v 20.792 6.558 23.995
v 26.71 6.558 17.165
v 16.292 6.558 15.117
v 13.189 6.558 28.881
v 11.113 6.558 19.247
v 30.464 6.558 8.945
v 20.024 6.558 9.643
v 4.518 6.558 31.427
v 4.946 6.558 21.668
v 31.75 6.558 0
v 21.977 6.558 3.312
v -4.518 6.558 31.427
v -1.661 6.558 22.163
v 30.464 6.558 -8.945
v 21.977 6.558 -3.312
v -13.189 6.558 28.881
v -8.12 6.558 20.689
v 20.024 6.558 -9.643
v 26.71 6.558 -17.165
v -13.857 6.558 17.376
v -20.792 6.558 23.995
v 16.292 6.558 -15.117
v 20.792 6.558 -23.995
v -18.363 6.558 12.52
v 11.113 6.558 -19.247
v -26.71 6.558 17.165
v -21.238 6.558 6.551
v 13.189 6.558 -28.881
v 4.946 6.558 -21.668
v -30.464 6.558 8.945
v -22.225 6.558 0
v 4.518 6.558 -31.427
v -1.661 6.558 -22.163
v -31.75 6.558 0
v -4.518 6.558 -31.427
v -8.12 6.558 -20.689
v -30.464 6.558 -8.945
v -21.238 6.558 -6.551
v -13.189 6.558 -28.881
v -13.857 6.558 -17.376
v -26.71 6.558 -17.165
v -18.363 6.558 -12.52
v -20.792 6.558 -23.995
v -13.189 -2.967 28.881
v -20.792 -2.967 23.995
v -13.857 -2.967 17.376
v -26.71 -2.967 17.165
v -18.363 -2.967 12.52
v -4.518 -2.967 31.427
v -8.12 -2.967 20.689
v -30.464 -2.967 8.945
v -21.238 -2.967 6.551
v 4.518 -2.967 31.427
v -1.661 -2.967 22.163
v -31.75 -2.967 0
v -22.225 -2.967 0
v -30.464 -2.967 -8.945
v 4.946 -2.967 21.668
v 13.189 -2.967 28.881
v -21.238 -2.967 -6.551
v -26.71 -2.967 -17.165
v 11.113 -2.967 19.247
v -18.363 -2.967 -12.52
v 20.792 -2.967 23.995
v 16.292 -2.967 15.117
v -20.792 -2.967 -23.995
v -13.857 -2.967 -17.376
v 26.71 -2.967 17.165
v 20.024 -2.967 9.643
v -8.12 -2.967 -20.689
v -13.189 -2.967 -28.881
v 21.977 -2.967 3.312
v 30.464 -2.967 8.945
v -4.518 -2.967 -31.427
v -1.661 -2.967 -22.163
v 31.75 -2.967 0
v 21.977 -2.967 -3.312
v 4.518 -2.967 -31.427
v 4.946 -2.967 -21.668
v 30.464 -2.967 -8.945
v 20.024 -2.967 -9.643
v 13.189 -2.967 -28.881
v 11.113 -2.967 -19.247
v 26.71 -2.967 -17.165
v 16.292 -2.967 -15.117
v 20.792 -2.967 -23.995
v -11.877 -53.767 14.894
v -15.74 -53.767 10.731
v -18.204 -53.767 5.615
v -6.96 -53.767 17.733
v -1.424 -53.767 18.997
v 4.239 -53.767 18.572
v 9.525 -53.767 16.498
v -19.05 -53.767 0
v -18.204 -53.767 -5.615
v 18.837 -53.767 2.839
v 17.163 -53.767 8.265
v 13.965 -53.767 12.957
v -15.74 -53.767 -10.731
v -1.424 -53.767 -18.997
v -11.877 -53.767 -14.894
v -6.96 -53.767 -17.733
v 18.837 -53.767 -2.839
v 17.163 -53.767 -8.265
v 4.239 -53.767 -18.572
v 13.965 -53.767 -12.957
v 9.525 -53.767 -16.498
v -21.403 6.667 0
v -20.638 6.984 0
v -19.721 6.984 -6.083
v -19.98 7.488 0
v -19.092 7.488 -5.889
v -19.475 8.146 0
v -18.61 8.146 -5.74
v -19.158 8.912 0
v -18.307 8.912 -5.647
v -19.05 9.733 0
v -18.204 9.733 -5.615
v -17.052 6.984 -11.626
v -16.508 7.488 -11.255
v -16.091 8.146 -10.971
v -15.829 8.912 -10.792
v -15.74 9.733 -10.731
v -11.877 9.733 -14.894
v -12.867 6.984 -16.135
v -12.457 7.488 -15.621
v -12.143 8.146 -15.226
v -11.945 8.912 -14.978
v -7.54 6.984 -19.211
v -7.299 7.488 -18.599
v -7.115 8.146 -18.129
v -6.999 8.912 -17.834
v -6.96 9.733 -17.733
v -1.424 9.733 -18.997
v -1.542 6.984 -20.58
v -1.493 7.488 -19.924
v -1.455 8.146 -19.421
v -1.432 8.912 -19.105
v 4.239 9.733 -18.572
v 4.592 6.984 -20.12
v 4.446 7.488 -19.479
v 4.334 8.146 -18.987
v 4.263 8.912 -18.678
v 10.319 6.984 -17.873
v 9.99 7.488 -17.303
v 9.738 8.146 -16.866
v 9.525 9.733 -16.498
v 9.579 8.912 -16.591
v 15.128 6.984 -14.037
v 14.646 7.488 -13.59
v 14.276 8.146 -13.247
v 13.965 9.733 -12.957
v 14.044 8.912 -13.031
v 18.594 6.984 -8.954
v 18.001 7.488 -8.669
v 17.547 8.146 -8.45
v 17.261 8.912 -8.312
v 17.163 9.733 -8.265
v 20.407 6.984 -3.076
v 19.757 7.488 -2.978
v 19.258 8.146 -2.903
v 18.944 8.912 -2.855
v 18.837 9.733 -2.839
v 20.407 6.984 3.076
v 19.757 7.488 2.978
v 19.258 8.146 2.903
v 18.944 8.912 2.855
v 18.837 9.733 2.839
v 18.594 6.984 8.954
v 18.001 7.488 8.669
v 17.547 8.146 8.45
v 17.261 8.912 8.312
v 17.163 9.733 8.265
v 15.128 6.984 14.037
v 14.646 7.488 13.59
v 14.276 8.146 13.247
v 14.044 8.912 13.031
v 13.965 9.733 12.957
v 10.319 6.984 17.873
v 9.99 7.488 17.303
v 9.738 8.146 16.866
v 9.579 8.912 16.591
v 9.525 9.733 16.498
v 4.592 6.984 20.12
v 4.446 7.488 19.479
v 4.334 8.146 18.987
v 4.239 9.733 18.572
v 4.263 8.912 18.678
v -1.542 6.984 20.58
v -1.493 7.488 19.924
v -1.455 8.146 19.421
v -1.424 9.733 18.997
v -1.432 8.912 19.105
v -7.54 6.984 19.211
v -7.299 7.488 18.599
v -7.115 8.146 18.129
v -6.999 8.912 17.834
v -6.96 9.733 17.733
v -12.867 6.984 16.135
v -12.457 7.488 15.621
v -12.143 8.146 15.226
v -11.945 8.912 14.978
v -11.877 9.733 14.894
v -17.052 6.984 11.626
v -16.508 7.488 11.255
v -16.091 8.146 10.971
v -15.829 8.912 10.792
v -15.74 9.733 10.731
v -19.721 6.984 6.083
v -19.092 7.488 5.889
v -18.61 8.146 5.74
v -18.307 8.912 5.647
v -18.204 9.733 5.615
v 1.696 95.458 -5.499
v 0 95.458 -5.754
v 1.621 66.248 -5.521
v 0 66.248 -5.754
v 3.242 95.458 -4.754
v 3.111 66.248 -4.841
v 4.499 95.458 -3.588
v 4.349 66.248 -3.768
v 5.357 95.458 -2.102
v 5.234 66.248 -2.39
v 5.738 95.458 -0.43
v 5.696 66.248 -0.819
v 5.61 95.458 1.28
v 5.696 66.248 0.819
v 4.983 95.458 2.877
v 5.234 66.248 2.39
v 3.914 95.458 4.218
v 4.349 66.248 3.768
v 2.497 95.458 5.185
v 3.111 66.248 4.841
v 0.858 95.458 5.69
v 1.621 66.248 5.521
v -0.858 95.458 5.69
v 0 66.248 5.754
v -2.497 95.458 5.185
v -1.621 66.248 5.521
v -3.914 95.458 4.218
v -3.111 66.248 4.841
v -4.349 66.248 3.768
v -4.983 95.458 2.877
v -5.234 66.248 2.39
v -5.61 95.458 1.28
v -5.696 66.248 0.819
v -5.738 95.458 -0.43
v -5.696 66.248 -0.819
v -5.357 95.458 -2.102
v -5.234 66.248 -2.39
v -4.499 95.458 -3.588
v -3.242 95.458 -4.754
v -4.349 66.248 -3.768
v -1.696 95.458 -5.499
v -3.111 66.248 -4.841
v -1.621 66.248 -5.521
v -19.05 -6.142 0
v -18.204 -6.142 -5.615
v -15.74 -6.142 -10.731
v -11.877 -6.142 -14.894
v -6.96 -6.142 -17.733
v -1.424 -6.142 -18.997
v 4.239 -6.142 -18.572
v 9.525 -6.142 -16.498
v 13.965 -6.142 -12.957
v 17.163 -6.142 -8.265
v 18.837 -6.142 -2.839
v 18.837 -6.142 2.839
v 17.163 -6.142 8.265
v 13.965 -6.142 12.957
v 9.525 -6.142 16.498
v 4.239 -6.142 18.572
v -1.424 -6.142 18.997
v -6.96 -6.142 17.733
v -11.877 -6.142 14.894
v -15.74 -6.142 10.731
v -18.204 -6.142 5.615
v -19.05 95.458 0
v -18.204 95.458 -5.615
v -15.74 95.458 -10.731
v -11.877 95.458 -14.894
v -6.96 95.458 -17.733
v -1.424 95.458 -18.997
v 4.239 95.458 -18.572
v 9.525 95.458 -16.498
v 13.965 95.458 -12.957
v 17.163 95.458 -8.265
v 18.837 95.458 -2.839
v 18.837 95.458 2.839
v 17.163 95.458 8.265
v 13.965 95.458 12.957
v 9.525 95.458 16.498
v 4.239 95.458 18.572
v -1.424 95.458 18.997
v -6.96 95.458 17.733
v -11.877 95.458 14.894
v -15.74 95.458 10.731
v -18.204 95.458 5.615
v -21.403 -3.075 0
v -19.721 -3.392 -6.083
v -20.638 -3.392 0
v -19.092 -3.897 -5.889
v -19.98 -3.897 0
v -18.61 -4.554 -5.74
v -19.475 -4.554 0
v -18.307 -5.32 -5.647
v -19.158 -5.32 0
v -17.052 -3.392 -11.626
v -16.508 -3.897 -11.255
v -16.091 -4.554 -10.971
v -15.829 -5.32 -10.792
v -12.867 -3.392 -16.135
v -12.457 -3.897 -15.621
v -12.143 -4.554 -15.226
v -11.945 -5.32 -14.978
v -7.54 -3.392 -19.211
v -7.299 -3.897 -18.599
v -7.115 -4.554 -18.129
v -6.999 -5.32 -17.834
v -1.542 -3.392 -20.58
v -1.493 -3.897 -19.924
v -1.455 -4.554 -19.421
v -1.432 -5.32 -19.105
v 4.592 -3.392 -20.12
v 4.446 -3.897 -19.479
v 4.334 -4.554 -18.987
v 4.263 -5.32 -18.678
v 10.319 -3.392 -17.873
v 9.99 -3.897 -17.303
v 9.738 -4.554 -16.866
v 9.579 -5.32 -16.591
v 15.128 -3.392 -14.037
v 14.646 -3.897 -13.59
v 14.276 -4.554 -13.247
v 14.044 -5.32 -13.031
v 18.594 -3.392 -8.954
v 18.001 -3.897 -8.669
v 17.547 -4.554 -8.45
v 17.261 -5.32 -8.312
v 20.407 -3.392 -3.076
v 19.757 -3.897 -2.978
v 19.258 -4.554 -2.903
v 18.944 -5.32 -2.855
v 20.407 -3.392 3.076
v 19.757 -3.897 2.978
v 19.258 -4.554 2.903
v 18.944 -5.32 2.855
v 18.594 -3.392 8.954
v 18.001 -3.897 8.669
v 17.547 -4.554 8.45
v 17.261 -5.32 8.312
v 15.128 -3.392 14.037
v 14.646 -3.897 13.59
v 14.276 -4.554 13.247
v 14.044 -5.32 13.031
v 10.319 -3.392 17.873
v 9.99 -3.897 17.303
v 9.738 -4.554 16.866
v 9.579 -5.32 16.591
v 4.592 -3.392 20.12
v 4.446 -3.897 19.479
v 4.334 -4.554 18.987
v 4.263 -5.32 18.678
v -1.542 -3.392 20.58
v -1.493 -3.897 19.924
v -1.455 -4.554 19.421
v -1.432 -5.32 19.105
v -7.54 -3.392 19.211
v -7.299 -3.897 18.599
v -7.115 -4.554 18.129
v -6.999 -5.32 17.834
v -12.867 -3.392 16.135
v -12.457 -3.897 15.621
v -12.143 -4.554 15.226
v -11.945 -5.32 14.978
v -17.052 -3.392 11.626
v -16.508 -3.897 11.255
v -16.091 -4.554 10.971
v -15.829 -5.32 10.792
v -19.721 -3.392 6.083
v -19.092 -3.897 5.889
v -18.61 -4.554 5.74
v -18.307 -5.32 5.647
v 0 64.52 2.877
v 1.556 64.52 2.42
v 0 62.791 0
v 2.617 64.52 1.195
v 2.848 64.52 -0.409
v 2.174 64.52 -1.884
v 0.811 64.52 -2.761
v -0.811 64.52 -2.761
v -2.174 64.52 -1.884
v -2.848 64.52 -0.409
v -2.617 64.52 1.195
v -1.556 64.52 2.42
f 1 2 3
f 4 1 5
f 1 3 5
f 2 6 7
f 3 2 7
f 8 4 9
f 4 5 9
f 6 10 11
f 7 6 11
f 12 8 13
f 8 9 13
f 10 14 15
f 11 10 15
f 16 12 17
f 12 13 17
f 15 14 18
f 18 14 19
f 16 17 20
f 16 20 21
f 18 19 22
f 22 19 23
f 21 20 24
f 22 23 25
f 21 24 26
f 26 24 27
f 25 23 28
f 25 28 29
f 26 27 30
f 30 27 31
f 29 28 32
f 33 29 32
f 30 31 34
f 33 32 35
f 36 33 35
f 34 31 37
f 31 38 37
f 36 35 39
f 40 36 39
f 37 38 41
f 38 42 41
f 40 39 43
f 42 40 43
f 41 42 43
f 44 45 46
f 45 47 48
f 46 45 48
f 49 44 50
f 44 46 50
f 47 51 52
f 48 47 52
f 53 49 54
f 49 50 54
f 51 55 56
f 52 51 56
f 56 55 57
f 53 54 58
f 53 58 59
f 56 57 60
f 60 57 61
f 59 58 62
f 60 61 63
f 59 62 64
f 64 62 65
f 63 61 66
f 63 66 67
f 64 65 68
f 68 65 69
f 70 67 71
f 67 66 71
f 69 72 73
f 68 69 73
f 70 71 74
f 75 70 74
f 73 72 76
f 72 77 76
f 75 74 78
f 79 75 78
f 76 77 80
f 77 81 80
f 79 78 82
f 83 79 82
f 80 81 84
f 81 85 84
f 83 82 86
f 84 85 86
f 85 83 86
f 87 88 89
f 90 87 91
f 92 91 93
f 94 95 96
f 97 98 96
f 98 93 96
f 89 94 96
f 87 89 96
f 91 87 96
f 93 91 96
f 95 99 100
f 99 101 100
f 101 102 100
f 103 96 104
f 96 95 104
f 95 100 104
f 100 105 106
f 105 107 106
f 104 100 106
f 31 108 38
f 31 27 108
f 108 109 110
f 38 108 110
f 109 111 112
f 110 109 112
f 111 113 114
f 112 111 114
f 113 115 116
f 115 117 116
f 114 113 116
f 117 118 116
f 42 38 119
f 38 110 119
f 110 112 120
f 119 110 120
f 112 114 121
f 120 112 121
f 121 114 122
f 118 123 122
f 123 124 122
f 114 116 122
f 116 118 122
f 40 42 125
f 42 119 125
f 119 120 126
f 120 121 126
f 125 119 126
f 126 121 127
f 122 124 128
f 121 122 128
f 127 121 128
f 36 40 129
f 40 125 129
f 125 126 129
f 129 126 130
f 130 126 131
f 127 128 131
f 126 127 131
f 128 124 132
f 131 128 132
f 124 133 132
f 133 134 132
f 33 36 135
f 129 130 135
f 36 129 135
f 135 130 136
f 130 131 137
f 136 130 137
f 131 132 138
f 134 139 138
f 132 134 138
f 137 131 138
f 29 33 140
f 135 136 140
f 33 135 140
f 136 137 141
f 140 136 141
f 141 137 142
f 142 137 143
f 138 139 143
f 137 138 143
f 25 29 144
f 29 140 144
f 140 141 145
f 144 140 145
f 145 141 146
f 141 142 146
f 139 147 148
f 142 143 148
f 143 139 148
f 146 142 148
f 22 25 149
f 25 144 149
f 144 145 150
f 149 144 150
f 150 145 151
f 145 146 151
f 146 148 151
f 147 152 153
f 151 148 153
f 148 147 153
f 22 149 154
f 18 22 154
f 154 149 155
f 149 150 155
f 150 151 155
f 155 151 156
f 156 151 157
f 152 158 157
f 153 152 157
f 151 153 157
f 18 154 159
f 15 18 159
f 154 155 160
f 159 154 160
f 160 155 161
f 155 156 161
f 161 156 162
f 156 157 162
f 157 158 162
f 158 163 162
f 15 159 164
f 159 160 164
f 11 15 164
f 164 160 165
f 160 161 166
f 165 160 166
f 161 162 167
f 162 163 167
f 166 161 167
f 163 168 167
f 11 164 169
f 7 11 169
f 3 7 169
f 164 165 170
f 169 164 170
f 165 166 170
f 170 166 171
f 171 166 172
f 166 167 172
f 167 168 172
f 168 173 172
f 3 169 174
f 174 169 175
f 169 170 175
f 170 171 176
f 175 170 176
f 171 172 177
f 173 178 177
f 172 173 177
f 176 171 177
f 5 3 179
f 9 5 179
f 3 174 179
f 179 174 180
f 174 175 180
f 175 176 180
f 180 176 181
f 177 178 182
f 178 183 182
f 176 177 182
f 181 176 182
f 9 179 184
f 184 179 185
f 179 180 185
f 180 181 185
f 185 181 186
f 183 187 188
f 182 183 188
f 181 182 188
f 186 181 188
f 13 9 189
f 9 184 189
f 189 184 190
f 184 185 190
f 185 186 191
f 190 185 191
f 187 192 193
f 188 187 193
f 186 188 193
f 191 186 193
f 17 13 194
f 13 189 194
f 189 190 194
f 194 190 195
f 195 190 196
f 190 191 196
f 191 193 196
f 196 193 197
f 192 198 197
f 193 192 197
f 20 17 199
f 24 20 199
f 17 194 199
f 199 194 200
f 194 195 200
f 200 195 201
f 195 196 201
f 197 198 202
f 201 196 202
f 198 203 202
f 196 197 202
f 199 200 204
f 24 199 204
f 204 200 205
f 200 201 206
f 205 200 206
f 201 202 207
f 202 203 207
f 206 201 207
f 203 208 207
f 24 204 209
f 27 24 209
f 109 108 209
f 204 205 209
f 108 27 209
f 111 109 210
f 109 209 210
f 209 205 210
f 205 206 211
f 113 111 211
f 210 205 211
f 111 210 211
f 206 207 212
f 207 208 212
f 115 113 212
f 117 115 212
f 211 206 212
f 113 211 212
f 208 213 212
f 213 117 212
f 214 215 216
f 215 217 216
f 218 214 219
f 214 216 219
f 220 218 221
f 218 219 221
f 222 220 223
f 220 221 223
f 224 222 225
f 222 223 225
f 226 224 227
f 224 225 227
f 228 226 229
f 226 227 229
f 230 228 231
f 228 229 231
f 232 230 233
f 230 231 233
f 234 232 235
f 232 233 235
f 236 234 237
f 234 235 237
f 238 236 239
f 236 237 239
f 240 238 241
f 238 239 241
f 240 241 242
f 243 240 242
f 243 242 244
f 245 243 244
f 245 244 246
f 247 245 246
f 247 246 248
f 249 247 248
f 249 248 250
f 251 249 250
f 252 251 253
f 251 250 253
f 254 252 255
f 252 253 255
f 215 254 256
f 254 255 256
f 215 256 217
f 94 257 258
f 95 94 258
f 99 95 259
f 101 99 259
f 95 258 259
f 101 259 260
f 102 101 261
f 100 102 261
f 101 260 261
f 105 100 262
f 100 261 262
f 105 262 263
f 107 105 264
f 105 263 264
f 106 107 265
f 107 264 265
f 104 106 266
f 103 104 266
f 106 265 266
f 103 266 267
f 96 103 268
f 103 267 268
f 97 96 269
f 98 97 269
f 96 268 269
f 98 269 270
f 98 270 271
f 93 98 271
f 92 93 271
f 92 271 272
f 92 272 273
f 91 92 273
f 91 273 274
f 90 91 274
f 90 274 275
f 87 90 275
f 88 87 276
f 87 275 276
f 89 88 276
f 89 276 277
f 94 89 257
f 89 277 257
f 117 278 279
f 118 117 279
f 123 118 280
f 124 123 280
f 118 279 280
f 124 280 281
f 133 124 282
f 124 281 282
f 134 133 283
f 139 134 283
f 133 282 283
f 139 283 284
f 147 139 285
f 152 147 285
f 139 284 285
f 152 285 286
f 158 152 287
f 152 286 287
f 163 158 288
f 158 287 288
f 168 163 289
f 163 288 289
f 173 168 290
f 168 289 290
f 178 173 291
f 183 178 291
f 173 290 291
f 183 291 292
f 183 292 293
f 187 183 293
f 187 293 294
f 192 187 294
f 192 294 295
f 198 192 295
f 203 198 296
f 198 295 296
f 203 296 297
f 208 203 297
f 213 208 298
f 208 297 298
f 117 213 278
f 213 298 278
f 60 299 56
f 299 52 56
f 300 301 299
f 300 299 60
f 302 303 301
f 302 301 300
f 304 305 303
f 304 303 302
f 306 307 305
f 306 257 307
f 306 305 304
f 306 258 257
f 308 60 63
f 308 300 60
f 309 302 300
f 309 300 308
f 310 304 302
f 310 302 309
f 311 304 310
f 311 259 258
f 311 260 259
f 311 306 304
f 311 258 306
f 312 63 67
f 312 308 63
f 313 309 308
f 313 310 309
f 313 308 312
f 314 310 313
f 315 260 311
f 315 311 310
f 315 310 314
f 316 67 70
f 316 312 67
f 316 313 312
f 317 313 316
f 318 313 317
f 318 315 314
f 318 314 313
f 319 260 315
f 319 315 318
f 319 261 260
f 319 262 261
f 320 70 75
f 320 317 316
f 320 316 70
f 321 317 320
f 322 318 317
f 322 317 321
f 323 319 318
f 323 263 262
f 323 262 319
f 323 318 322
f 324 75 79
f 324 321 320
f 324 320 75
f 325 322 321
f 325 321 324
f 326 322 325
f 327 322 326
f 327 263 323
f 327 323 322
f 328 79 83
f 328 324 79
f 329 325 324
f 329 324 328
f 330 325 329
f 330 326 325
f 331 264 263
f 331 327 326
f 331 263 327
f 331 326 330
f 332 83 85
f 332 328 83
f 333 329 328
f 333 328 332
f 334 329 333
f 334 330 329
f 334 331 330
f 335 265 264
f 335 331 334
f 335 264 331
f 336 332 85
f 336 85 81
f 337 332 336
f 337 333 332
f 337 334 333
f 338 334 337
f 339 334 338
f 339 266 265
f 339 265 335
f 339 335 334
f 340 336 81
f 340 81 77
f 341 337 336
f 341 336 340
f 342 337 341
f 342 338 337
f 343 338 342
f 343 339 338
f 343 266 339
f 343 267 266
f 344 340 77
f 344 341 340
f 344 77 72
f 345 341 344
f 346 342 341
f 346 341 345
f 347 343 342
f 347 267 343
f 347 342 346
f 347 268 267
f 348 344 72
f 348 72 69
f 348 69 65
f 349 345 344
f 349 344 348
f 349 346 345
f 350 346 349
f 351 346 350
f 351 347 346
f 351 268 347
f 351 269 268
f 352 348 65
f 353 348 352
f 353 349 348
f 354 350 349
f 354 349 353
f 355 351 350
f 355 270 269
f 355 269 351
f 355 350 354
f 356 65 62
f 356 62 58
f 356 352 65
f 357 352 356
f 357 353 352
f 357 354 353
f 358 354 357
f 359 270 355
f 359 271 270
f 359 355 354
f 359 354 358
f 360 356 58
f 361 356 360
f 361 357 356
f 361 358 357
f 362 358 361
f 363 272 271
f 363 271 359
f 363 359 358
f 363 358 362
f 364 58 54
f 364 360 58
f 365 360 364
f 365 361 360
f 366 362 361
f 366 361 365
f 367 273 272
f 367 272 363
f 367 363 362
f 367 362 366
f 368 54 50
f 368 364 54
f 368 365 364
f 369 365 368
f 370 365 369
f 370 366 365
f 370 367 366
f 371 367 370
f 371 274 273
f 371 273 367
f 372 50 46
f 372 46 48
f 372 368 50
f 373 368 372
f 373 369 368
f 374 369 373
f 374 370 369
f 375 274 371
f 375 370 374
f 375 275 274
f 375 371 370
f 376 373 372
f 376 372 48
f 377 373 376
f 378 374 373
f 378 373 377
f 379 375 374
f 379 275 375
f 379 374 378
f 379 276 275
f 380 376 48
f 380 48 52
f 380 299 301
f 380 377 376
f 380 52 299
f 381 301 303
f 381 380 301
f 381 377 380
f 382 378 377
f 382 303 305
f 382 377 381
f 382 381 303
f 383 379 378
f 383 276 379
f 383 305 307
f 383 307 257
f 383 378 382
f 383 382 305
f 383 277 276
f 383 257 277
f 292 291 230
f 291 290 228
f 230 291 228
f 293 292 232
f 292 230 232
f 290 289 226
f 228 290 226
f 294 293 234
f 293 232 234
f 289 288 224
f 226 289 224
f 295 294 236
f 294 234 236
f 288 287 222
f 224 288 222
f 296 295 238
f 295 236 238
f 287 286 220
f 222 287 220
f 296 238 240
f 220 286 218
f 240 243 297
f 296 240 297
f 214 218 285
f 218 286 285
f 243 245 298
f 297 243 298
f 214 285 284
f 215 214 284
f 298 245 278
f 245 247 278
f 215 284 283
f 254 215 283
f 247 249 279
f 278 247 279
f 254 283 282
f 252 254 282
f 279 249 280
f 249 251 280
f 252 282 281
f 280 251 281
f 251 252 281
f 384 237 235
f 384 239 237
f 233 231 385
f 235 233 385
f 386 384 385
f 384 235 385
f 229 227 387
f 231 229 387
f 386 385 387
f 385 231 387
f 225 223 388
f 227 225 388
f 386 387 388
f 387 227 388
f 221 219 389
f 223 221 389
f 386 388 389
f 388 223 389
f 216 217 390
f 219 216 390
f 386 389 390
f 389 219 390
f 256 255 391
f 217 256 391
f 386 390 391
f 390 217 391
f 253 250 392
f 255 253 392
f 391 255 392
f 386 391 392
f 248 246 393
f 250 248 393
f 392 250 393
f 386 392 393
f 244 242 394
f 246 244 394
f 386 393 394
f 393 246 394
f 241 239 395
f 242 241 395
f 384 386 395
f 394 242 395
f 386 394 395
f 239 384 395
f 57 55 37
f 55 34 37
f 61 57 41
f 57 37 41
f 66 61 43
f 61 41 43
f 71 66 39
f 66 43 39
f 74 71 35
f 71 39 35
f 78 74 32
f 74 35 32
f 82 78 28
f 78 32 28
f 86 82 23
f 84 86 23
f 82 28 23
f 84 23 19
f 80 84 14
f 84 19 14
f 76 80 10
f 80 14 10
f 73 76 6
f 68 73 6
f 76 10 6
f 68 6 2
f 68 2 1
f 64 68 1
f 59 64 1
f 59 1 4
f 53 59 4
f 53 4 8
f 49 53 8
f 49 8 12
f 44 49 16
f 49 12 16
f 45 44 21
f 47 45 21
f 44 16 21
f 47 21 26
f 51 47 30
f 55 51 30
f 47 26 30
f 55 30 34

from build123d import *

# Parameters (mm, degrees)
F_1_2_20_TAPPED_HOLE1_D     = 11.50874
F_1_2_20_TAPPED_HOLE1_DEPTH = 29.21
F_1_2_20_TAPPED_HOLE1_TIP   = 3.45757432
FILLET1_R                   = 3.175


with BuildPart() as part:
    # Sketch1 → Revolve2 (revolve)
    with BuildSketch(Plane.XY):
        Polygon((-31.75, -2.966632853), (-31.75, 6.558367147), (-19.05, 6.558367147), (-19.05, 95.458367147), (0, 95.458367147), (0, 0), (0, -53.766632853), (-19.05, -53.766632853), (-19.05, -2.966632853), align=None)
    revolve(axis=Axis((0, 95.458367147, 0), (0, -1, 0)))

    # 1/2-20 Tapped Hole1
    with Locations(Plane.ZX.offset(95.458367147)):
        with Locations((0, 0)):
            Hole(F_1_2_20_TAPPED_HOLE1_D / 2, depth=F_1_2_20_TAPPED_HOLE1_DEPTH)
            with Locations((0, 0, -(F_1_2_20_TAPPED_HOLE1_DEPTH + F_1_2_20_TAPPED_HOLE1_TIP / 2))):  # 118° drill point
                Cone(0, F_1_2_20_TAPPED_HOLE1_D / 2, F_1_2_20_TAPPED_HOLE1_TIP, mode=Mode.SUBTRACT)

    # Fillet1
    fillet1_edges = [part.edges().sort_by_distance(p)[0] for p in [
        (19.05, 6.558367147, 0),
        (19.05, -2.966632853, 0),
    ]]
    fillet(fillet1_edges, radius=FILLET1_R)


solid = part.part
